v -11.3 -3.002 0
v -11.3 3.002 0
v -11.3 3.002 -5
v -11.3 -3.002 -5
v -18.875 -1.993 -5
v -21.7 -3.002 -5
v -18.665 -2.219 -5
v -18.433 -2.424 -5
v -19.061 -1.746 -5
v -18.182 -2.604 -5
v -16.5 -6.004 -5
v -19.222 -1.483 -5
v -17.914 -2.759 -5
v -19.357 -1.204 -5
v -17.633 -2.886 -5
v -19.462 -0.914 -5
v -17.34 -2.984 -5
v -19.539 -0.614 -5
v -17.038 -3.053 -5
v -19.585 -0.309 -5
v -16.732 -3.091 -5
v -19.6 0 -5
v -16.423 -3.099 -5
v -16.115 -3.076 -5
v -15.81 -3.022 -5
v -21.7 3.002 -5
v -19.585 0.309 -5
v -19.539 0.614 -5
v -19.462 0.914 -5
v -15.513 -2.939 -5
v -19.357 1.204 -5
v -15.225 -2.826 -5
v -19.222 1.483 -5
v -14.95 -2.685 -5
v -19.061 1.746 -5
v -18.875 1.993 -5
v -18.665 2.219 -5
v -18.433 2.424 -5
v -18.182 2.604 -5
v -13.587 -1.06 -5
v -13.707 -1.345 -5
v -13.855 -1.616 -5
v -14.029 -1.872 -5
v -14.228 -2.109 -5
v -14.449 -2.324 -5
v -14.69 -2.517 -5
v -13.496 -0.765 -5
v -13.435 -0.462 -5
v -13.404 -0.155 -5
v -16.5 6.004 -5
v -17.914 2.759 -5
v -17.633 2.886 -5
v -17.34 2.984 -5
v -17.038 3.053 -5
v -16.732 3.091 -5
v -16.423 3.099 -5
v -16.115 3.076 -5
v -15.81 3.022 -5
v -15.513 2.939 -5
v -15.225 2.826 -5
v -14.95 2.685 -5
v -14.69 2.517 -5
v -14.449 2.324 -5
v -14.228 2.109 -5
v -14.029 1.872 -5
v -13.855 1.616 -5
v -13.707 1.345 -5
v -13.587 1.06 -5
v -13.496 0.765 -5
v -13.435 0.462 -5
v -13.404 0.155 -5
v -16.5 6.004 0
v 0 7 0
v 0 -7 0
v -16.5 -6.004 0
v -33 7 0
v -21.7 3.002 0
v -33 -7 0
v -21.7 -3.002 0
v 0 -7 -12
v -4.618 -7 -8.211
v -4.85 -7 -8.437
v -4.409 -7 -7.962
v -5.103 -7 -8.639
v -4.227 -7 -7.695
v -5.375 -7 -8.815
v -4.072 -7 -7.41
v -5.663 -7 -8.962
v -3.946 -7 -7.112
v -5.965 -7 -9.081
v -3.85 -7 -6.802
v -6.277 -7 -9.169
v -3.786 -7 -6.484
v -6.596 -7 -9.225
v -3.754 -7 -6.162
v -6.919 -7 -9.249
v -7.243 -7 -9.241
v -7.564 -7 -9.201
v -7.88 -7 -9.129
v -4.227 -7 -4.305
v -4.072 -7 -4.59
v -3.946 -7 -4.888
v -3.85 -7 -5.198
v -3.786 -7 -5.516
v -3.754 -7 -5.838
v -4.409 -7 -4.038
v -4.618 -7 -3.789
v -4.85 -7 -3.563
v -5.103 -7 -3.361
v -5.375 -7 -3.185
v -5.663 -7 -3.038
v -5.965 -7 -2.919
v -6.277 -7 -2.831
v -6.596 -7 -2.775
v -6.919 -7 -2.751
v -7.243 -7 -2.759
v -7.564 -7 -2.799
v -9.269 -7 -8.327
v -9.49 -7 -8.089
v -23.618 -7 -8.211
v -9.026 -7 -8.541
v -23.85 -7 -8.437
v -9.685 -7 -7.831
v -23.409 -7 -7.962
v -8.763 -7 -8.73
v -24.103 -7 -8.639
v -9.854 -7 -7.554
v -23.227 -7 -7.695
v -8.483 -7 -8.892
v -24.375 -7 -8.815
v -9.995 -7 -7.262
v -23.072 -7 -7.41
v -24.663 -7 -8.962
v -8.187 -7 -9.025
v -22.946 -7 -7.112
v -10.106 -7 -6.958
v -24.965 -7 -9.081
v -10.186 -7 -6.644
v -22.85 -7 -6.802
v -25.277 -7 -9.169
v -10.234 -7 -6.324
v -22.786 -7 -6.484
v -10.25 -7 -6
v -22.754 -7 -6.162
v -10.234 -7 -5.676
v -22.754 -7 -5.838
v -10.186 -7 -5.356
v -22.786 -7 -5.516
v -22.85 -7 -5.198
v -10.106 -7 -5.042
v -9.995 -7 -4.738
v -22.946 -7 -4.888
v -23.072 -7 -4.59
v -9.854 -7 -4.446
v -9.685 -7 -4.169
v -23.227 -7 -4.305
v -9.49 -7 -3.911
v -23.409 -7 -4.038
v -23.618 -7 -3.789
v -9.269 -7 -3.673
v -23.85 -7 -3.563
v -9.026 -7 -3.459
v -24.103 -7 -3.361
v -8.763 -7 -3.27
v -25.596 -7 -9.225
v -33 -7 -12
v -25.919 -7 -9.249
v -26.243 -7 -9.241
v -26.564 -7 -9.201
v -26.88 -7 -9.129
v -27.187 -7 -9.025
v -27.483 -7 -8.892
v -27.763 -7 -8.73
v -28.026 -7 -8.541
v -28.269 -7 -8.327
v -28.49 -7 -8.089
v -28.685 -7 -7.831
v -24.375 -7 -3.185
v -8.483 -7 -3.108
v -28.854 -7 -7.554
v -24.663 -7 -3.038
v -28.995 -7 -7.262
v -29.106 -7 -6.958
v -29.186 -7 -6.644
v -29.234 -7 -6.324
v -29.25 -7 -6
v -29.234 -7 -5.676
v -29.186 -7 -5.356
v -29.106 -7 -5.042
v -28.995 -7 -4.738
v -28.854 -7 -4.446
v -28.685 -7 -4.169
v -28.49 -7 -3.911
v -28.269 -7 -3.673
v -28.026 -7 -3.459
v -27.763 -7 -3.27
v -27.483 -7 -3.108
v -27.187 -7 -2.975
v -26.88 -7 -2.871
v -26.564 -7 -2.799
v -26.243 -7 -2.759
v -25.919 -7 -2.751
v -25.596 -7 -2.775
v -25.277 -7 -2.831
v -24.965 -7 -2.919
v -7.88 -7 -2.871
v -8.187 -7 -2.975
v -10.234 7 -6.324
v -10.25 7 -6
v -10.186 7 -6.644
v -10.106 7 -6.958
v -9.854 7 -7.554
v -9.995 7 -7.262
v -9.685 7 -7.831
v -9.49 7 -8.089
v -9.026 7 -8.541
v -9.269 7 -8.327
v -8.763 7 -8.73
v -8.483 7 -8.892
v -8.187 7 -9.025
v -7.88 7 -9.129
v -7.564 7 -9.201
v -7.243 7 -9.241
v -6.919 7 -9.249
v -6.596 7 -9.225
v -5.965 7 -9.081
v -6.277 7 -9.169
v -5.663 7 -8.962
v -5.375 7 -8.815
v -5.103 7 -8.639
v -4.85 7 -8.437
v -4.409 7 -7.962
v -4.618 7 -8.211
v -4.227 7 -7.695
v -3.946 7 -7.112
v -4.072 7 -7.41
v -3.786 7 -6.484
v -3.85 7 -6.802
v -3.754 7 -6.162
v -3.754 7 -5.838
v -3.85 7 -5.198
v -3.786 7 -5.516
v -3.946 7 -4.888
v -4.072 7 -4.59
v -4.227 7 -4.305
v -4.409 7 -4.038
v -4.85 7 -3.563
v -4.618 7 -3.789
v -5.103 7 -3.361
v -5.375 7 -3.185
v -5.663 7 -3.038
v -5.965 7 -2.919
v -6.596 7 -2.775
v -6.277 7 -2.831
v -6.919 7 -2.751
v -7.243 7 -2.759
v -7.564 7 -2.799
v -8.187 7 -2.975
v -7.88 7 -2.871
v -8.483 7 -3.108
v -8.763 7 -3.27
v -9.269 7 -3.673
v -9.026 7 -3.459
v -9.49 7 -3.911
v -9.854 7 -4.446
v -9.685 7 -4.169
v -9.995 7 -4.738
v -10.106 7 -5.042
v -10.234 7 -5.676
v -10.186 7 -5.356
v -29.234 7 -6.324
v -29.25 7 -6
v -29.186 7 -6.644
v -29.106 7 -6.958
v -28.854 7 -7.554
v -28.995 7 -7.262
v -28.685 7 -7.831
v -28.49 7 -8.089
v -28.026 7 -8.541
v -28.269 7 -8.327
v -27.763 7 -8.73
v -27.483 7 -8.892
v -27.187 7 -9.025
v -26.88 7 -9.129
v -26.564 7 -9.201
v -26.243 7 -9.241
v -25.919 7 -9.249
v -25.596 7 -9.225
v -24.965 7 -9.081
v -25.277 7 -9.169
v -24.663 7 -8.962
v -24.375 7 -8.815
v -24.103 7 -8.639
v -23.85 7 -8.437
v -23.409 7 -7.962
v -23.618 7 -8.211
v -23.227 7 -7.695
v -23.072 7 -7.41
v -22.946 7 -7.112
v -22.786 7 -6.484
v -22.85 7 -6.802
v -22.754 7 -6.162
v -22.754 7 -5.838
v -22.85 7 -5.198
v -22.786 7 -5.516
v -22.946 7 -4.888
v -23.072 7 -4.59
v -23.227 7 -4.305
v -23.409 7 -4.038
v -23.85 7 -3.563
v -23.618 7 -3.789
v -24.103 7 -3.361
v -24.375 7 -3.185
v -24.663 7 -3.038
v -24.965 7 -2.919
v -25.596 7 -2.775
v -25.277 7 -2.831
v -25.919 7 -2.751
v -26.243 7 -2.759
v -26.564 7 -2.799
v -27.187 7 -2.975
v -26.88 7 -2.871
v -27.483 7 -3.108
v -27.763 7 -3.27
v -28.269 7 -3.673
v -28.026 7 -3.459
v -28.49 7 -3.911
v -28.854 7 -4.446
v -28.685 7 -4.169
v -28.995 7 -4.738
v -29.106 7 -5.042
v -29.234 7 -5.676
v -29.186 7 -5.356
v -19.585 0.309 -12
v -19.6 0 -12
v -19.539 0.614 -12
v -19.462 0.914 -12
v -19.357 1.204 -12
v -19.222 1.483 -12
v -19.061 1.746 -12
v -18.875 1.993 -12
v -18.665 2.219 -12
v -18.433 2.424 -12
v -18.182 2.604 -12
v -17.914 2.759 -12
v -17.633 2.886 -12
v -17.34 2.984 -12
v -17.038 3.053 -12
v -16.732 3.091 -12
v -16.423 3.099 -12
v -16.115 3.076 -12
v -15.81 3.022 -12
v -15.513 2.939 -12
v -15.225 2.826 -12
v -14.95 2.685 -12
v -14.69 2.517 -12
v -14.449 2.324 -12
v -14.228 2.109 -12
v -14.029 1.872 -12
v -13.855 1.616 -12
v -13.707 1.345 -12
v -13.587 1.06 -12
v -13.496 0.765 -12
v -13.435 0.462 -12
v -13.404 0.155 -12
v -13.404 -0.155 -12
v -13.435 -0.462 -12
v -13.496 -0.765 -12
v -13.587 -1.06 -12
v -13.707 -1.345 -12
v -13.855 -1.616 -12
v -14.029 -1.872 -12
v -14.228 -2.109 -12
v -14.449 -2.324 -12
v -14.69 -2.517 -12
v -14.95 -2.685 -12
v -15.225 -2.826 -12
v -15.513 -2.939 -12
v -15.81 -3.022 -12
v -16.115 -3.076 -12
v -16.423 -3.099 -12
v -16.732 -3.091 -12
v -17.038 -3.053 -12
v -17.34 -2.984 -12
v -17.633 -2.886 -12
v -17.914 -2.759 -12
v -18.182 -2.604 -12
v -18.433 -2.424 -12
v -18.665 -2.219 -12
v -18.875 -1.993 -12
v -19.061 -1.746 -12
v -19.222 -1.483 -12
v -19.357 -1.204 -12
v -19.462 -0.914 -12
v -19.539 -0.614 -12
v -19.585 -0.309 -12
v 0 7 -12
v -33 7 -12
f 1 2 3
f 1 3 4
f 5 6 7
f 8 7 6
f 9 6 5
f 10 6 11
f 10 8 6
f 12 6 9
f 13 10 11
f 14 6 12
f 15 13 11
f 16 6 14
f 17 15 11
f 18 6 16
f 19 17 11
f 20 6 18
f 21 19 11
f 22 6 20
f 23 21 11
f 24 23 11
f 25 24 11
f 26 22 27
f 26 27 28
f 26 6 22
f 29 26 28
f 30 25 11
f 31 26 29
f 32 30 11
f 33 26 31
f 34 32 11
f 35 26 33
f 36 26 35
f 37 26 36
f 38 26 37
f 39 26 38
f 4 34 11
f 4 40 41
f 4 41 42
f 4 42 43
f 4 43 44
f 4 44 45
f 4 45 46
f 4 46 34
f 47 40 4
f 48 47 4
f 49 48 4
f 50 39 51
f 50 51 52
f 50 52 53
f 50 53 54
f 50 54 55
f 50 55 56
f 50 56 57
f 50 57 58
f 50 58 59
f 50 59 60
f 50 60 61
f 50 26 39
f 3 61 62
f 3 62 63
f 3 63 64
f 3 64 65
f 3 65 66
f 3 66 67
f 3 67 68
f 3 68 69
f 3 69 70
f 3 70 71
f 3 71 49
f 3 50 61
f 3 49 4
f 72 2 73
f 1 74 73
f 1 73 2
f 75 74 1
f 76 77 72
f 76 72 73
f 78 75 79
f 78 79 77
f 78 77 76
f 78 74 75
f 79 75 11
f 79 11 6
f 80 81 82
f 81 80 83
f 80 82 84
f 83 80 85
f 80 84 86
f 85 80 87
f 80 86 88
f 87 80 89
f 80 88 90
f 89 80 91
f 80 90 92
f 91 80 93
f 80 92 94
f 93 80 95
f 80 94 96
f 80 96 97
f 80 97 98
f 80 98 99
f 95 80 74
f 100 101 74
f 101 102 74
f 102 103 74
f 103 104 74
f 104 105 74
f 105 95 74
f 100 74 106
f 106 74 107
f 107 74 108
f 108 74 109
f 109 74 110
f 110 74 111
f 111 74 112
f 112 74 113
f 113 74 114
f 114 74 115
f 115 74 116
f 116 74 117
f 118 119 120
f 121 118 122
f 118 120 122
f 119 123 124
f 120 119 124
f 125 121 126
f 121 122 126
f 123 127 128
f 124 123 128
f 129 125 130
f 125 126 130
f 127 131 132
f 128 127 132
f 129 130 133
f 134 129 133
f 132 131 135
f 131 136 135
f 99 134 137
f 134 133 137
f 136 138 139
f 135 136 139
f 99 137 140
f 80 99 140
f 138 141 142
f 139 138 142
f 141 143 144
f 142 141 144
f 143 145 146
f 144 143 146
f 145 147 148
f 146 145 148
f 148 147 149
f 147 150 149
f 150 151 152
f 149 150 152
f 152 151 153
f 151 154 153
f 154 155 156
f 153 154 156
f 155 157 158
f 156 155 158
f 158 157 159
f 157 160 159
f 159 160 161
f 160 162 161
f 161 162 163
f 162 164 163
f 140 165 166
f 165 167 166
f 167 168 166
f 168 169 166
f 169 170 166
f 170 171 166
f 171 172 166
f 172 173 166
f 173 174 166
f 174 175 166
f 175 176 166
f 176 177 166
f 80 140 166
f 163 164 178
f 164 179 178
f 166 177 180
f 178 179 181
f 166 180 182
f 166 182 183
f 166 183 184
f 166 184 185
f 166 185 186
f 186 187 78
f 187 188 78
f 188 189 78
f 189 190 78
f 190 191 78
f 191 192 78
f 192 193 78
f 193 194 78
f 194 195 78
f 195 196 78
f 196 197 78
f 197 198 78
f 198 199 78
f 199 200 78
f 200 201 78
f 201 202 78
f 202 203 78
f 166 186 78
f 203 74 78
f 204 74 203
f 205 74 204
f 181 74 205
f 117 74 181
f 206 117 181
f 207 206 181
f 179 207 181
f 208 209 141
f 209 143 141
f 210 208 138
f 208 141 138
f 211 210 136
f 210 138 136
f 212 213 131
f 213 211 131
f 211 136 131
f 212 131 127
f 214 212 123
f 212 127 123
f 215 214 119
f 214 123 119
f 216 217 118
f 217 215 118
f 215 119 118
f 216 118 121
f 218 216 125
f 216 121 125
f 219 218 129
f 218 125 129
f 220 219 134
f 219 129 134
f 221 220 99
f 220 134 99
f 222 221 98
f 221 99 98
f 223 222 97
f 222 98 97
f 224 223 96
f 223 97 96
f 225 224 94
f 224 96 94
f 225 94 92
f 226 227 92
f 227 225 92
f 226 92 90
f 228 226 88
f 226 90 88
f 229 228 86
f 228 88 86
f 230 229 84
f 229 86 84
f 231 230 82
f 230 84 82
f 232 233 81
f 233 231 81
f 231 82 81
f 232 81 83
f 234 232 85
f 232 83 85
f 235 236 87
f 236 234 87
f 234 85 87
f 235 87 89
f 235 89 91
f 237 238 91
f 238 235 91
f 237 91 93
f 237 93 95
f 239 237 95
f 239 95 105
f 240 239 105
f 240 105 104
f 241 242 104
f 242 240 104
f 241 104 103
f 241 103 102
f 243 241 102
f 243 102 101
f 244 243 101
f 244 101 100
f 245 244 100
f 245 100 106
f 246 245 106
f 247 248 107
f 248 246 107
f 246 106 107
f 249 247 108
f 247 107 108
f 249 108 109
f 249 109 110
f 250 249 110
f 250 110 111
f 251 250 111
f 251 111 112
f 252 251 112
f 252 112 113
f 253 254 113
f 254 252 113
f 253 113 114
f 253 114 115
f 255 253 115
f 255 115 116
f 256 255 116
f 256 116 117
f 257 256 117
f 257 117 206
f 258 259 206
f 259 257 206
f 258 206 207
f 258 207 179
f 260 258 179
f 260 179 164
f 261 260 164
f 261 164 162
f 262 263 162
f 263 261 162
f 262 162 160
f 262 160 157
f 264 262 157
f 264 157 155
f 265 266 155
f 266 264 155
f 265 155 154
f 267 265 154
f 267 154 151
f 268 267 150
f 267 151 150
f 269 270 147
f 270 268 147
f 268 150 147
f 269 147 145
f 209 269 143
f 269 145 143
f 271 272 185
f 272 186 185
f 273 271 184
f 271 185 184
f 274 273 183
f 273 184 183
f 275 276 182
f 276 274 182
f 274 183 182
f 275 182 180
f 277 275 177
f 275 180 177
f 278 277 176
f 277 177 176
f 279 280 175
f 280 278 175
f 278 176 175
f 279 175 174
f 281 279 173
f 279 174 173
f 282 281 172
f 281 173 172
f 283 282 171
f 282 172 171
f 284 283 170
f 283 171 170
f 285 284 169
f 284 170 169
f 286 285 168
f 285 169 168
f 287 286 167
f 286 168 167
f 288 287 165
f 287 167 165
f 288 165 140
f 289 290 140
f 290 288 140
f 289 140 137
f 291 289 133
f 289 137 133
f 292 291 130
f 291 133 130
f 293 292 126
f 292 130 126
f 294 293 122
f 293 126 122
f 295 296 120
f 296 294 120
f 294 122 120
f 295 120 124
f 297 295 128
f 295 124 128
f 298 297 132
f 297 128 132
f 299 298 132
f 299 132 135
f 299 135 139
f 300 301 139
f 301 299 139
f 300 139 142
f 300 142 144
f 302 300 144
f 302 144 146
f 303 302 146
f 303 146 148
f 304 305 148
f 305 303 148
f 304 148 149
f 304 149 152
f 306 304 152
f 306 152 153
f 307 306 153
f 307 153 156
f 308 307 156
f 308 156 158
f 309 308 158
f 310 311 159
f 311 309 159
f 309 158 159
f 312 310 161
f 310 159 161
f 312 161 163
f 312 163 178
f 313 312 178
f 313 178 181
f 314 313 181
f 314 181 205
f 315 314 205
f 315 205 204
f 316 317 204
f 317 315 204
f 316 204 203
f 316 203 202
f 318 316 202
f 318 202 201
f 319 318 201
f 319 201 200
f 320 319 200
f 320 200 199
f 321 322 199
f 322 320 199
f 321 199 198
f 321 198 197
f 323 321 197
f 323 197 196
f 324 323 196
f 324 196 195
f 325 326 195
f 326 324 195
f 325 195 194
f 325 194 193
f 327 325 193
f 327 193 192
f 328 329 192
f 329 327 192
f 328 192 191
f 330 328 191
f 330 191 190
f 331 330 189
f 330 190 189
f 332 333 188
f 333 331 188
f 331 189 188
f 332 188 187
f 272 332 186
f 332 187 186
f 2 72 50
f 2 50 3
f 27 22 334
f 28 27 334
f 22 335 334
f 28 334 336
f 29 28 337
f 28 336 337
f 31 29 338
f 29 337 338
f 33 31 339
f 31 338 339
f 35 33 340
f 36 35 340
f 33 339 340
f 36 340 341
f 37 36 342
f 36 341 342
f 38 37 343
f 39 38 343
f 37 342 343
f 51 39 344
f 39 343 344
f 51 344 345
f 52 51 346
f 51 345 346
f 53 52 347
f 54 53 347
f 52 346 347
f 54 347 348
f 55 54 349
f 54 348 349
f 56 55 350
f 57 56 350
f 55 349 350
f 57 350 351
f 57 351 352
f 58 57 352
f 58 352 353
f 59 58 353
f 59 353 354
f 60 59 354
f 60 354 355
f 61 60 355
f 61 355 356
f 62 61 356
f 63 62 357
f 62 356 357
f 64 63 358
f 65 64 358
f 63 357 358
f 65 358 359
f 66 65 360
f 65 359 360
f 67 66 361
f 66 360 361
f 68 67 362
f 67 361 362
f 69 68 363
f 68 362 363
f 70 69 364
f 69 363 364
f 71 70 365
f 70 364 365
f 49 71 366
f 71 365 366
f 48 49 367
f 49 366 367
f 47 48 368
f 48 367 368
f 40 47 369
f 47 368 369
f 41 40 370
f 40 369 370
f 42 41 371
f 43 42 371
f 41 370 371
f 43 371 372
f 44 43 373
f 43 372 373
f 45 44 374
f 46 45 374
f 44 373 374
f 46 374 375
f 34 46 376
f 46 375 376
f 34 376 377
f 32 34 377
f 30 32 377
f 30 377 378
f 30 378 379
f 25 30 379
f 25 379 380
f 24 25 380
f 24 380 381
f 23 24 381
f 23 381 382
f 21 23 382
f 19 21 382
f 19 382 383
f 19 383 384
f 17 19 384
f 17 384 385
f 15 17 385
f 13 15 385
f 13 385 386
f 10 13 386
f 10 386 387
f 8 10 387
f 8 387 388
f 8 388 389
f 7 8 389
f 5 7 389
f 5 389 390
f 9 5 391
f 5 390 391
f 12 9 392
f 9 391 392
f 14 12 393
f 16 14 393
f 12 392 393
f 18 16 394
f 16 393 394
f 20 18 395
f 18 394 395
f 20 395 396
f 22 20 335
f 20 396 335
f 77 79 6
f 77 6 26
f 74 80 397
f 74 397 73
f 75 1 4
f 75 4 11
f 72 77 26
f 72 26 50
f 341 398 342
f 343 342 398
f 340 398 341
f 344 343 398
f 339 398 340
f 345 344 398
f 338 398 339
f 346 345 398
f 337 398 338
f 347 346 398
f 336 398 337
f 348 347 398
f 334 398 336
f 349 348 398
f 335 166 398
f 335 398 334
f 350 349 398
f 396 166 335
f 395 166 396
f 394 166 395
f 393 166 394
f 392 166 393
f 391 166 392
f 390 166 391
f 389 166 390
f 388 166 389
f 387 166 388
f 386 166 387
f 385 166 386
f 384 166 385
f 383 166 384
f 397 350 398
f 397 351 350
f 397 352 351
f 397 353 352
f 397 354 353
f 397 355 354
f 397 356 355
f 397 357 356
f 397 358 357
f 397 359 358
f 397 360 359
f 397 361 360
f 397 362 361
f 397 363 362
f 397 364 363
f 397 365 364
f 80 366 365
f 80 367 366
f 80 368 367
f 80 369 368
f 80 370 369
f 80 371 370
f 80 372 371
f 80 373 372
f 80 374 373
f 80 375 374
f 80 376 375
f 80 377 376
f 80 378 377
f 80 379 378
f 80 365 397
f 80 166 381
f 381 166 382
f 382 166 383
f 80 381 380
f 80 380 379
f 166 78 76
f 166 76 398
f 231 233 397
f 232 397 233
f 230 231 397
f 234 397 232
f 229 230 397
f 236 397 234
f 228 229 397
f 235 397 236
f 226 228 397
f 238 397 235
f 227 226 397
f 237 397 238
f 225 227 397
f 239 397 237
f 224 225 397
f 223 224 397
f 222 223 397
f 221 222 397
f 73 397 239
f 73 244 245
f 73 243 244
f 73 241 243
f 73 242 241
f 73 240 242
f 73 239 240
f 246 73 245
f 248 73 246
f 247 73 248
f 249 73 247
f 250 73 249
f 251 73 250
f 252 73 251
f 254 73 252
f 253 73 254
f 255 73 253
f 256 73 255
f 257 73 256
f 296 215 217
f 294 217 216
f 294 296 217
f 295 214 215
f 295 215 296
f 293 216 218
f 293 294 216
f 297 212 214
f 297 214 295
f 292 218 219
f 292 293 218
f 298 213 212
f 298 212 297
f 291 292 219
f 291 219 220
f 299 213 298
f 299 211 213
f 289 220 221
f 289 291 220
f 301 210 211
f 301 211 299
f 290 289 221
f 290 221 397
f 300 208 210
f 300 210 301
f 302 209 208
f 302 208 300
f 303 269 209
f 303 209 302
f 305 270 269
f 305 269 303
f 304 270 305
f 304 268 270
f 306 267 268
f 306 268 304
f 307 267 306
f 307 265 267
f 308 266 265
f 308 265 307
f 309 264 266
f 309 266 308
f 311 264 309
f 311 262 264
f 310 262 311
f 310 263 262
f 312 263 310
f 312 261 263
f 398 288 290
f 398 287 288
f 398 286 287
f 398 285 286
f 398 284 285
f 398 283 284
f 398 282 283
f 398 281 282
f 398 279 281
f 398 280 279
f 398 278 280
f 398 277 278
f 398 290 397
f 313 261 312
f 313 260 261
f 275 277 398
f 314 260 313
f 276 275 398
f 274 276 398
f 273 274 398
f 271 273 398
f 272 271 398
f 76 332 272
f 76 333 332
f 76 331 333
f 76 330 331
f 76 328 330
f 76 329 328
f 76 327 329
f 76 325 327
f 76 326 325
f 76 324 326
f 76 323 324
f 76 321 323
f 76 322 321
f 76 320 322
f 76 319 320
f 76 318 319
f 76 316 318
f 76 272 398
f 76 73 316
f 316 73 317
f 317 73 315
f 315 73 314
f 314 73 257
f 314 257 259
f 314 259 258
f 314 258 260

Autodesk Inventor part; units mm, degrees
ref_plane "YZ Plane" through (0, 0, 0) normal (1, 0, 0) x (0, 1, 0)
ref_plane "XZ Plane" through (0, 0, 0) normal (0, 1, 0) x (-1, 0, 0)
ref_plane "XY Plane" through (0, 0, 0) normal (0, 0, 1) x (1, 0, 0)
sketch "Sketch1" plane through (0, 0, 0) normal (0, 1, 0) x (-1, 0, 0)
  line L0 (0, 0) -> (33, 0)
  line L1 (33, 0) -> (33, -12)
  line L2 (33, -12) -> (0, -12)
  line L3 (0, -12) -> (0, 0)
  circle A0 centre (26, -6) radius 3.25
  circle A1 centre (7, -6) radius 3.25
  dimension "d0" = 12
  dimension "d1" = 33
  dimension "d2" = 6.5
  dimension "d3" = 6.5
  dimension "d4" = 7
  dimension "d6" = 6
  dimension "d7" = 6
  dimension "d9" = 19
extrude "Extrusion1" add sketch "Sketch1" along normal mid plane 14
sketch "Sketch2" plane through (0, -7, -12) normal (0, 0, -1) x (-1, 0, 0)
  circle A0 centre (16.5, 7) radius 3.1
  line L0 (33, 14) -> (33, 0) projected
  line L1 (33, 0) -> (0, 0) projected
  point P0 (0, 7)
  dimension "d12" = 6.2
  dimension "d14" = 16.5
  dimension "d20" = 7
extrude "Extrusion2" cut sketch "Sketch2" against normal up to next
sketch "Sketch3" plane through (-33, -7, 0) normal (0, 0, 1) x (1, 0, 0)
  circle A0 centre (16.5, 7) radius 3.1 projected
  line L0 (16.5, 13.0044) -> (21.7, 10.0022)
  line L1 (21.7, 10.0022) -> (21.7, 3.9978)
  line L2 (21.7, 3.9978) -> (16.5, 0.9956)
  line L3 (16.5, 0.9956) -> (11.3, 3.9978)
  line L4 (11.3, 3.9978) -> (11.3, 10.0022)
  line L5 (11.3, 10.0022) -> (16.5, 13.0044)
  line L6 (0, 14) -> (33, 14) projected
  line L7 (0, 14) -> (0, 0) projected
  point P0 (33, 7)
  dimension "d17" = 5.2
extrude "Extrusion3" cut sketch "Sketch3" against normal blind 5
properties part number "smallSprocketFixture" material "ABS Plastic"
